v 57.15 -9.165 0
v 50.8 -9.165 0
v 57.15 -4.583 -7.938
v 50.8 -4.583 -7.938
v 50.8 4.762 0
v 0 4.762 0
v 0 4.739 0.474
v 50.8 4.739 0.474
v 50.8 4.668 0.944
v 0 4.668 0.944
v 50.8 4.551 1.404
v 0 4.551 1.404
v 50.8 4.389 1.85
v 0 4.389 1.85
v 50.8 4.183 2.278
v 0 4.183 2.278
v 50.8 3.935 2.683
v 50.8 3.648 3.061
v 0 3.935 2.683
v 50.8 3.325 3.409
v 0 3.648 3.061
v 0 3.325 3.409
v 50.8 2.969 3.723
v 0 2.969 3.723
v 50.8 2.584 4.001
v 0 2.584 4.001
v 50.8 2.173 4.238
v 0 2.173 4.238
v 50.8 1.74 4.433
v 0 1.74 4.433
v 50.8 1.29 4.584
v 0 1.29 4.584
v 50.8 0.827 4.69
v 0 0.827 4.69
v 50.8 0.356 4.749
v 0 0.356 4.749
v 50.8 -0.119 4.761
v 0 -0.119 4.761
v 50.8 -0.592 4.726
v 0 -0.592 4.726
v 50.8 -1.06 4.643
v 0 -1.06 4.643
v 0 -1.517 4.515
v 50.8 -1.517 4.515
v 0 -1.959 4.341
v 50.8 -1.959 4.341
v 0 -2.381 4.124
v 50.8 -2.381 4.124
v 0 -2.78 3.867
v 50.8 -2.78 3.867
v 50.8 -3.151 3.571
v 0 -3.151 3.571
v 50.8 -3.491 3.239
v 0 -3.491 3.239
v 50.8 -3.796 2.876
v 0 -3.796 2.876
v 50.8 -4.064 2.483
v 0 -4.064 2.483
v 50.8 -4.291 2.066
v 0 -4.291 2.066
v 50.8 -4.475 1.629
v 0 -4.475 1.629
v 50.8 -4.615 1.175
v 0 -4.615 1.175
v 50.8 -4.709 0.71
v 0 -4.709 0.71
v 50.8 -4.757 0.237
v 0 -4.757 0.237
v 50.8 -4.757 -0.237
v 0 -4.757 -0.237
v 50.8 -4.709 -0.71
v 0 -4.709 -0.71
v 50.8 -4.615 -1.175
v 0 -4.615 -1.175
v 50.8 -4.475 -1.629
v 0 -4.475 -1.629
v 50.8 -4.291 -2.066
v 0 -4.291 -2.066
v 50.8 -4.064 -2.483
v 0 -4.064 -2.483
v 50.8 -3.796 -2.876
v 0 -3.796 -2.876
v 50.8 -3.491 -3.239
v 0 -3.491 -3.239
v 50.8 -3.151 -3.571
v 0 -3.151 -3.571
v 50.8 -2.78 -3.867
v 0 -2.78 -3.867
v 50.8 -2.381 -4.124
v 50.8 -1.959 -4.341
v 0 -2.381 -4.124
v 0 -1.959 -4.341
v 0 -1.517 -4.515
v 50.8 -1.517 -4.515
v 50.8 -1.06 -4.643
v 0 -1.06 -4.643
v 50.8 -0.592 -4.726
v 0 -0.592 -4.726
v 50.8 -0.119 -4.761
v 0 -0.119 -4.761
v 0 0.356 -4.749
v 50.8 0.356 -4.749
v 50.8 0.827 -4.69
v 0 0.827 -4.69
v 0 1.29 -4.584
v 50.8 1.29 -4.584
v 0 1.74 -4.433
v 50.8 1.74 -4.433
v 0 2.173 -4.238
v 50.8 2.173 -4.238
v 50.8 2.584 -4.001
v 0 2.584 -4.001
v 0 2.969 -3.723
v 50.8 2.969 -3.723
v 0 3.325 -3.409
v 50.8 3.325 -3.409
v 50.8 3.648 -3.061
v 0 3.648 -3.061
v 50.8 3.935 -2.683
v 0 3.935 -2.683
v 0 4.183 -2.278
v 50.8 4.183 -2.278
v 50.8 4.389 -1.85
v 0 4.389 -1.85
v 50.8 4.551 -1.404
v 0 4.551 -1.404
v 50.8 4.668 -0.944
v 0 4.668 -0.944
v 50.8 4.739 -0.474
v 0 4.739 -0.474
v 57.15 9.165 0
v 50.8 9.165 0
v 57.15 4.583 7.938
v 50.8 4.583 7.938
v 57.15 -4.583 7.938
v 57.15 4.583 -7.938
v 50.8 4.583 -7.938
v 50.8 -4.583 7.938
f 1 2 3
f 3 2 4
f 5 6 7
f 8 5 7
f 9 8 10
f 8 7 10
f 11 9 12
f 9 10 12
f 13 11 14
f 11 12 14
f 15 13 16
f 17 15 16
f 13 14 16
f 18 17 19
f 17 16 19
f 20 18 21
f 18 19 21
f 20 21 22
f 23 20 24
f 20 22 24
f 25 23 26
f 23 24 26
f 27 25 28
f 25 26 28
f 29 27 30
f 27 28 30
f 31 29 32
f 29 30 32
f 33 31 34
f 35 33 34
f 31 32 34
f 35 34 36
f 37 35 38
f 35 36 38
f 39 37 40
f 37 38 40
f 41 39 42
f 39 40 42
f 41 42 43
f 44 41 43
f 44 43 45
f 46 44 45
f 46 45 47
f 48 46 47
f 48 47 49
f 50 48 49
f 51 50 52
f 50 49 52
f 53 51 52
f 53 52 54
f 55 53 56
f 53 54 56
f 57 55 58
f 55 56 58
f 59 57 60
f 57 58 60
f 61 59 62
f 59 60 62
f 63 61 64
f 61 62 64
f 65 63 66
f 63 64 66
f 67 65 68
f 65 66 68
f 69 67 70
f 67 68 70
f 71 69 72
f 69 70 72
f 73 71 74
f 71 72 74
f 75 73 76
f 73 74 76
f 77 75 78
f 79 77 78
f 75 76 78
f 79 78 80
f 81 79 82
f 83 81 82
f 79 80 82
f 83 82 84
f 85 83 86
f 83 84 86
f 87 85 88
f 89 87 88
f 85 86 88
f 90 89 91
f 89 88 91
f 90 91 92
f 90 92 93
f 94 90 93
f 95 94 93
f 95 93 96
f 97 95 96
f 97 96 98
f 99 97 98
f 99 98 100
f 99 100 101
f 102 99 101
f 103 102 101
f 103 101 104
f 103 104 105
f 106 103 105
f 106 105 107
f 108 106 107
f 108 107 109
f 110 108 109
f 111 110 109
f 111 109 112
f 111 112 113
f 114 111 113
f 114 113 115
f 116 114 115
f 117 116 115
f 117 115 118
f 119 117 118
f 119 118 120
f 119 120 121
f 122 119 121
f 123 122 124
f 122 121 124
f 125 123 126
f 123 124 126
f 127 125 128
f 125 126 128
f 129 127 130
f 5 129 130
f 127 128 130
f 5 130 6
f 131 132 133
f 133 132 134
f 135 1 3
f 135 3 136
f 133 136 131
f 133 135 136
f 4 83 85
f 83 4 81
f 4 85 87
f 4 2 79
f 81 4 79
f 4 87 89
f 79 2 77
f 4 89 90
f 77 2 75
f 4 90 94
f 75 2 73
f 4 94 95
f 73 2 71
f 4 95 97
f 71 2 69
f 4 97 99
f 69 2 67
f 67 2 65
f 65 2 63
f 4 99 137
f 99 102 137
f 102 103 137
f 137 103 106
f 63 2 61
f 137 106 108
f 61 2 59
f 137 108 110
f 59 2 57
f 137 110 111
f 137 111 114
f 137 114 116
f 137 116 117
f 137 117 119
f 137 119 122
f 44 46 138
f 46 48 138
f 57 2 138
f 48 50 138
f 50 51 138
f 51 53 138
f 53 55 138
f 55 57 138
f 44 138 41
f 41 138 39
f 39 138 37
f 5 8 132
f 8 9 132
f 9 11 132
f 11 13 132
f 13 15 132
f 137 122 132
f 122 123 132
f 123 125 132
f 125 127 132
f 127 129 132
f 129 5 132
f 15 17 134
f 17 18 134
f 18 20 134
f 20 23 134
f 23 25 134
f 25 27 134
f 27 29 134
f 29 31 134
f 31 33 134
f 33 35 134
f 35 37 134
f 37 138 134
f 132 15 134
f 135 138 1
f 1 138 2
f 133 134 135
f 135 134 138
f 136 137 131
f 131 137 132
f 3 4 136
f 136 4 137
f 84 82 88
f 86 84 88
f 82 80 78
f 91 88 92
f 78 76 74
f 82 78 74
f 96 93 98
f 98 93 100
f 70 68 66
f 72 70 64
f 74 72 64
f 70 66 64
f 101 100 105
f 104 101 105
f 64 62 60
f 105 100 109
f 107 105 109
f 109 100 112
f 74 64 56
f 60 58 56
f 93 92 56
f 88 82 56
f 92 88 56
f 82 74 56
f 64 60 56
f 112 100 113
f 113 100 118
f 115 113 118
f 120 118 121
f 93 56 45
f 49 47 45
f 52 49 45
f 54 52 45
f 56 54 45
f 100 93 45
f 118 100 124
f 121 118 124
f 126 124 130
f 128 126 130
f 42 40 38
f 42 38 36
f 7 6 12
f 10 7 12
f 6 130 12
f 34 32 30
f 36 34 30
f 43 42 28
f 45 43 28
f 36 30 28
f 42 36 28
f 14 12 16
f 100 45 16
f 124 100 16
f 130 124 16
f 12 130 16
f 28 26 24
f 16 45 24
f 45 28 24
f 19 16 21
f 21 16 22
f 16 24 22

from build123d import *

# Parameters (mm, degrees)
F0_R     = 4.7625
F1_DEPTH = 50.8
F3_DEPTH = 6.35


with BuildPart() as f1:
    # F0 (on Right) → F1 (new body)
    with BuildSketch(Plane.YZ):
        Circle(F0_R)
    extrude(amount=F1_DEPTH)

    # F2 (on face) → F3 (join)
    with BuildSketch(Plane.YZ.offset(50.8)):
        Polygon((4.582718, 7.9375), (-4.582718, 7.9375), (-9.165436, 0), (-4.582718, -7.9375), (4.582718, -7.9375), (9.165436, 0), align=None)
    extrude(amount=F3_DEPTH)


solid = f1.part
